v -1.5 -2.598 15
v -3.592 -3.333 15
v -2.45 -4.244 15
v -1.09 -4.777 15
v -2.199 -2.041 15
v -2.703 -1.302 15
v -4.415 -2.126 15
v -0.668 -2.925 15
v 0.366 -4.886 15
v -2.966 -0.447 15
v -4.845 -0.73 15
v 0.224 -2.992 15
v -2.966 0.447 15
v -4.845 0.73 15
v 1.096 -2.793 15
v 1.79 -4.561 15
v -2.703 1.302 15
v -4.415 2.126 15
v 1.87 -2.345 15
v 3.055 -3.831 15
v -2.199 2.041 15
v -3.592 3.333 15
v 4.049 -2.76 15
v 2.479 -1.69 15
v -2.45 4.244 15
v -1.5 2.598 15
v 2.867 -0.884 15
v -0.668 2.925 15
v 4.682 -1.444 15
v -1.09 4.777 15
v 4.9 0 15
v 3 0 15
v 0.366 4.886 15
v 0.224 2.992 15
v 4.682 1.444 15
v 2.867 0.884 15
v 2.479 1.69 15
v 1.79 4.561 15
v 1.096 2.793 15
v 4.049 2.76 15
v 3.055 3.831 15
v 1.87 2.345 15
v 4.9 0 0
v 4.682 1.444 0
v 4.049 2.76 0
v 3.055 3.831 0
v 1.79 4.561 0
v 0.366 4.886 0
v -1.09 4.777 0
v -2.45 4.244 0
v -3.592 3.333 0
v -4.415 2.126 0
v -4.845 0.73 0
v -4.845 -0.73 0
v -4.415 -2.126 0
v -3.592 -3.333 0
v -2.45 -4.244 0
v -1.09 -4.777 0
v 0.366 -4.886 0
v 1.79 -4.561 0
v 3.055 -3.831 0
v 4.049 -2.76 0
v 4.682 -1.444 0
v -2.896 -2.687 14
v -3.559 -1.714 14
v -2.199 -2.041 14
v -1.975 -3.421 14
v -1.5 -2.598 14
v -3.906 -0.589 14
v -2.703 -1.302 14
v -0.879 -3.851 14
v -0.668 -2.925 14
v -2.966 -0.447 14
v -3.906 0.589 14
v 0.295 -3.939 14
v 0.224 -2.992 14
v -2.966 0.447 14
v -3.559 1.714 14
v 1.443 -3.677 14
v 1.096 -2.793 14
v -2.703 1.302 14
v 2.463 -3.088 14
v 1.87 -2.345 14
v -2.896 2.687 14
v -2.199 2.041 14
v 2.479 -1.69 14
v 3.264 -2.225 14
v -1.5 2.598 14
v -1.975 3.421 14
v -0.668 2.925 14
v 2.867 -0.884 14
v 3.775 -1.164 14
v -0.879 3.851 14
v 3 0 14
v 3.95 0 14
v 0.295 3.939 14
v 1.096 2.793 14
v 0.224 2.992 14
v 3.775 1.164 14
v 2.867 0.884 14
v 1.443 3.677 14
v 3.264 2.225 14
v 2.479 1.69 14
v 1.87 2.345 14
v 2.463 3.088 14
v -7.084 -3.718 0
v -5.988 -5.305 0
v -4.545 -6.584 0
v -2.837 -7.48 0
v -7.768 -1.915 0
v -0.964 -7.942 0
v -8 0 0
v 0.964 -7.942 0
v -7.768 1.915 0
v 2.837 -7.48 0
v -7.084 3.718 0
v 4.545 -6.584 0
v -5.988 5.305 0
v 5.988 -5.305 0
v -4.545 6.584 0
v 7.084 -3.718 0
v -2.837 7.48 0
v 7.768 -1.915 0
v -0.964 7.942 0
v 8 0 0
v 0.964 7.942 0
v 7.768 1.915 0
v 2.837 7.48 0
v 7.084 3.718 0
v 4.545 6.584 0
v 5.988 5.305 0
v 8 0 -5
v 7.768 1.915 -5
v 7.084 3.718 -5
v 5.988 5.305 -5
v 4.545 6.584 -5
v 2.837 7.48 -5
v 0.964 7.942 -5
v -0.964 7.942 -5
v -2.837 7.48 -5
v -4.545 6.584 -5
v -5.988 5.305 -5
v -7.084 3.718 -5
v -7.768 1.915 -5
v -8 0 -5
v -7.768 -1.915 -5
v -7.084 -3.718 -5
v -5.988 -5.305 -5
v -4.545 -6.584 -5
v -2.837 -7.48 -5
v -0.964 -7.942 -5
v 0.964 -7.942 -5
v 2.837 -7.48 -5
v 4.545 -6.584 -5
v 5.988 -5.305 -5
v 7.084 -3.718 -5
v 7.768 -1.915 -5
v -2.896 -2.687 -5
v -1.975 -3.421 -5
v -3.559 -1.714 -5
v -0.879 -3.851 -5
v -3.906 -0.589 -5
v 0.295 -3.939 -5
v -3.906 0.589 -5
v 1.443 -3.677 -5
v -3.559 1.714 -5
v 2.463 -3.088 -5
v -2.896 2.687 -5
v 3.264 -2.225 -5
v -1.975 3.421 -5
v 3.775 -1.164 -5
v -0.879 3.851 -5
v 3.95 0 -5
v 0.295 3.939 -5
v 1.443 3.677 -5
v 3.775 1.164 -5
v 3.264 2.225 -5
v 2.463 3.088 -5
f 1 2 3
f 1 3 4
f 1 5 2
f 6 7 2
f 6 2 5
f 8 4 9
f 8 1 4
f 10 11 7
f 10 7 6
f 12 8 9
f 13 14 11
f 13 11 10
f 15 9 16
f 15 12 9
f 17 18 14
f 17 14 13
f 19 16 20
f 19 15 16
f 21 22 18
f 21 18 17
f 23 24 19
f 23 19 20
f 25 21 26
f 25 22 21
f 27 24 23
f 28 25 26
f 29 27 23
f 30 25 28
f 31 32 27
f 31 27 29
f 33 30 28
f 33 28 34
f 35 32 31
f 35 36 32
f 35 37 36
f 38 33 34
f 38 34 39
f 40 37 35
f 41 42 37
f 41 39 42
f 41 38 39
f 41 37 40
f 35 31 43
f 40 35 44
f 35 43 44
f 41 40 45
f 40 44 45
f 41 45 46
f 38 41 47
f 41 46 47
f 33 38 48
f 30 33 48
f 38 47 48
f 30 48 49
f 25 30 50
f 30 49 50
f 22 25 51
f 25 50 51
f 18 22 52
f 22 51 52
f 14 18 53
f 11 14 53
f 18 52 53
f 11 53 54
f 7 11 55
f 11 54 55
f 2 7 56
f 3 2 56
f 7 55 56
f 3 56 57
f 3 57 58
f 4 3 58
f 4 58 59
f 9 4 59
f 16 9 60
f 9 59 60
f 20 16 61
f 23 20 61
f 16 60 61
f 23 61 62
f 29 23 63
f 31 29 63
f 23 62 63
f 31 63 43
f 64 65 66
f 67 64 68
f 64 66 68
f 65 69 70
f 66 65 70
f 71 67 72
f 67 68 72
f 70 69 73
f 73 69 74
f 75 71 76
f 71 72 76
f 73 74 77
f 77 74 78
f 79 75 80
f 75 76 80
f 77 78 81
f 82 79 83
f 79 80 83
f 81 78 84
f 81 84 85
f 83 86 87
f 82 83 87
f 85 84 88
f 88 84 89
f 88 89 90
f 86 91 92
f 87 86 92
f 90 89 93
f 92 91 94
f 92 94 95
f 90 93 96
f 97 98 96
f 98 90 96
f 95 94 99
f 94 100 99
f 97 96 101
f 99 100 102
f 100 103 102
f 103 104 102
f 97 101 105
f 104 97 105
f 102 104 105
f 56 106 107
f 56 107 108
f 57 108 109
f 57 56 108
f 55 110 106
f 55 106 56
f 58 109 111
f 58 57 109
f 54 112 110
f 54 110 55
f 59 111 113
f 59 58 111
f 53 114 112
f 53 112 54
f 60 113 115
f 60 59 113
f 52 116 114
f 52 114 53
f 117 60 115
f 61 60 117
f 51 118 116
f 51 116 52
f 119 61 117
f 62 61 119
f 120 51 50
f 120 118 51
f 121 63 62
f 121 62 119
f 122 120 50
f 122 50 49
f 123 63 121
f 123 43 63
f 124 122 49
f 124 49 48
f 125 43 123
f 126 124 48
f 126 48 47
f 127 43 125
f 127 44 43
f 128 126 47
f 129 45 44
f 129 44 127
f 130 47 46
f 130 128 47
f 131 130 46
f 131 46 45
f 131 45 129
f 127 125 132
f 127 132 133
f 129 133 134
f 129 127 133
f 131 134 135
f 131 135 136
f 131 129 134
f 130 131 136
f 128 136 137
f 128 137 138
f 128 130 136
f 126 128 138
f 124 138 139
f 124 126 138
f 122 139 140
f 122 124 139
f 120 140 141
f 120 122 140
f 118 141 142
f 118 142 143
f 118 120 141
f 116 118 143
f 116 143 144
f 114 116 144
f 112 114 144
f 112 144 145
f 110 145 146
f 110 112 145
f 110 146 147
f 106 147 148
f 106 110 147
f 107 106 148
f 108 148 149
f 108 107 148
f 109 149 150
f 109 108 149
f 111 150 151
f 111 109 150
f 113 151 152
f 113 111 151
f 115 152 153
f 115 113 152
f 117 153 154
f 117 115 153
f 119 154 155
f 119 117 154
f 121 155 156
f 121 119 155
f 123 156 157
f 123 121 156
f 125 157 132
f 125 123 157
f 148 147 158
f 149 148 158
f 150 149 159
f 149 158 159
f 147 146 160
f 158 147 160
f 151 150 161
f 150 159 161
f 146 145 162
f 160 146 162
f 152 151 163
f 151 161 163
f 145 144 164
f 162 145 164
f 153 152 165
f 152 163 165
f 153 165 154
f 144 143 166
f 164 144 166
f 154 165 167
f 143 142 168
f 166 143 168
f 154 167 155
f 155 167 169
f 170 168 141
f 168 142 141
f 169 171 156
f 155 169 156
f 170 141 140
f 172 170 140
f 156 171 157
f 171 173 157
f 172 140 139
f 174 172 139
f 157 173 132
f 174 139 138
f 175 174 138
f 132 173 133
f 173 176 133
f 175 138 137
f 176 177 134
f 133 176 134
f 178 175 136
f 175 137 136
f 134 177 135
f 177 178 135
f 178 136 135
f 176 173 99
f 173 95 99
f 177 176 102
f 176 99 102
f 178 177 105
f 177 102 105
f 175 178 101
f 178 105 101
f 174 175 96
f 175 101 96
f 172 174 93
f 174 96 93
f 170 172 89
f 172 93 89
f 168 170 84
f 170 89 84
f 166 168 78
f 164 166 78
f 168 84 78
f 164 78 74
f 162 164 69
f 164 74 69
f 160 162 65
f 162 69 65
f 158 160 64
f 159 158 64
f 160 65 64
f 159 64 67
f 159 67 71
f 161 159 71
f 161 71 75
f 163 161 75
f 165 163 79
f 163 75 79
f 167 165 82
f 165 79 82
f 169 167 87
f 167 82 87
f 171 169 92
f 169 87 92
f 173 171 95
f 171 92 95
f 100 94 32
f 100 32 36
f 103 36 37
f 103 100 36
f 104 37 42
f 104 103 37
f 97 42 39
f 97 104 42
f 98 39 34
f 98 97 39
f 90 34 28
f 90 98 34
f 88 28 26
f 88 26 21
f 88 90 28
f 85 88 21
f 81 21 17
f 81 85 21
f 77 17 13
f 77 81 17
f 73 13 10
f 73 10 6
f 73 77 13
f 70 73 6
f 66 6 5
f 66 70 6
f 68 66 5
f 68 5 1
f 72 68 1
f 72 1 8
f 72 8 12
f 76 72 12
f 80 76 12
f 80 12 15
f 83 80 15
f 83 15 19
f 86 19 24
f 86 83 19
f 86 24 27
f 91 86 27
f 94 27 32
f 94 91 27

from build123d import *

# Parameters (mm, degrees)
F0_R          = 4.9
F1_DEPTH      = 14
F2_R          = 8
F3_DEPTH      = 5
F4_R          = 3.95
F5_DEPTH      = 25
F5_DEPTH_BACK = 25
F7_R          = 4.9
F7_R_2        = 3
F8_DEPTH      = 1


with BuildPart() as f1:
    # F0 (on Top) → F1 (new body)
    with BuildSketch(Plane.XY):
        Circle(F0_R)
    extrude(amount=F1_DEPTH)

    # F2 (on Top) → F3 (join)
    with BuildSketch(Plane.XY):
        Circle(F2_R)
    extrude(amount=-F3_DEPTH)

    # F4 (on Top) → F5 (cut, two sides)
    with BuildSketch(Plane.XY) as f5_sk:
        Circle(F4_R)
    extrude(amount=-F5_DEPTH, mode=Mode.SUBTRACT)
    extrude(f5_sk.sketch, amount=F5_DEPTH_BACK, mode=Mode.SUBTRACT)

    # F7 (on offset) → F8 (join)
    with BuildSketch(Plane.XY.offset(14)):
        Circle(F7_R)
        Circle(F7_R_2, mode=Mode.SUBTRACT)
    extrude(amount=F8_DEPTH)


solid = f1.part
